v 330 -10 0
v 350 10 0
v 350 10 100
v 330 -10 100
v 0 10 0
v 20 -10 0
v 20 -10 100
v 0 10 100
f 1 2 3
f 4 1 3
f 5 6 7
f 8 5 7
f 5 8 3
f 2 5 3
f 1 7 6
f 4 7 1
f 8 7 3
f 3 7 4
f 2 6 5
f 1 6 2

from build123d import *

# Parameters (mm, degrees)
F0_W     = 350
F0_H     = 100
F1_DEPTH = 10
F2_SIZE2 = 19.99999
F2_SIZE  = 19.99999
F3_SIZE2 = 19.99999
F3_SIZE  = 19.99999


# Not quite as in the source:
# - a fillet or chamfer is up to 0.001 mm smaller than in the source, because OpenCascade refuses the exact size


with BuildPart() as f1:
    # F0 (on Front) → F1 (new body, symmetric)
    with BuildSketch(Plane.XZ):
        with Locations((175, 50)):
            Rectangle(F0_W, F0_H)
    extrude(amount=F1_DEPTH, both=True)

    # F2 (size 20 and 20 in the source; OpenCascade refuses exactly that, so slightly less here)
    f2_edges = [f1.edges().sort_by_distance(p)[0] for p in [
        (0, -10, 50),
    ]]
    chamfer(f2_edges, length=F2_SIZE, length2=F2_SIZE2)

    # F3 (size 20 and 20 in the source; OpenCascade refuses exactly that, so slightly less here)
    f3_edges = [f1.edges().sort_by_distance(p)[0] for p in [
        (350, -10, 50),
    ]]
    chamfer(f3_edges, length=F3_SIZE, length2=F3_SIZE2)


solid = f1.part
